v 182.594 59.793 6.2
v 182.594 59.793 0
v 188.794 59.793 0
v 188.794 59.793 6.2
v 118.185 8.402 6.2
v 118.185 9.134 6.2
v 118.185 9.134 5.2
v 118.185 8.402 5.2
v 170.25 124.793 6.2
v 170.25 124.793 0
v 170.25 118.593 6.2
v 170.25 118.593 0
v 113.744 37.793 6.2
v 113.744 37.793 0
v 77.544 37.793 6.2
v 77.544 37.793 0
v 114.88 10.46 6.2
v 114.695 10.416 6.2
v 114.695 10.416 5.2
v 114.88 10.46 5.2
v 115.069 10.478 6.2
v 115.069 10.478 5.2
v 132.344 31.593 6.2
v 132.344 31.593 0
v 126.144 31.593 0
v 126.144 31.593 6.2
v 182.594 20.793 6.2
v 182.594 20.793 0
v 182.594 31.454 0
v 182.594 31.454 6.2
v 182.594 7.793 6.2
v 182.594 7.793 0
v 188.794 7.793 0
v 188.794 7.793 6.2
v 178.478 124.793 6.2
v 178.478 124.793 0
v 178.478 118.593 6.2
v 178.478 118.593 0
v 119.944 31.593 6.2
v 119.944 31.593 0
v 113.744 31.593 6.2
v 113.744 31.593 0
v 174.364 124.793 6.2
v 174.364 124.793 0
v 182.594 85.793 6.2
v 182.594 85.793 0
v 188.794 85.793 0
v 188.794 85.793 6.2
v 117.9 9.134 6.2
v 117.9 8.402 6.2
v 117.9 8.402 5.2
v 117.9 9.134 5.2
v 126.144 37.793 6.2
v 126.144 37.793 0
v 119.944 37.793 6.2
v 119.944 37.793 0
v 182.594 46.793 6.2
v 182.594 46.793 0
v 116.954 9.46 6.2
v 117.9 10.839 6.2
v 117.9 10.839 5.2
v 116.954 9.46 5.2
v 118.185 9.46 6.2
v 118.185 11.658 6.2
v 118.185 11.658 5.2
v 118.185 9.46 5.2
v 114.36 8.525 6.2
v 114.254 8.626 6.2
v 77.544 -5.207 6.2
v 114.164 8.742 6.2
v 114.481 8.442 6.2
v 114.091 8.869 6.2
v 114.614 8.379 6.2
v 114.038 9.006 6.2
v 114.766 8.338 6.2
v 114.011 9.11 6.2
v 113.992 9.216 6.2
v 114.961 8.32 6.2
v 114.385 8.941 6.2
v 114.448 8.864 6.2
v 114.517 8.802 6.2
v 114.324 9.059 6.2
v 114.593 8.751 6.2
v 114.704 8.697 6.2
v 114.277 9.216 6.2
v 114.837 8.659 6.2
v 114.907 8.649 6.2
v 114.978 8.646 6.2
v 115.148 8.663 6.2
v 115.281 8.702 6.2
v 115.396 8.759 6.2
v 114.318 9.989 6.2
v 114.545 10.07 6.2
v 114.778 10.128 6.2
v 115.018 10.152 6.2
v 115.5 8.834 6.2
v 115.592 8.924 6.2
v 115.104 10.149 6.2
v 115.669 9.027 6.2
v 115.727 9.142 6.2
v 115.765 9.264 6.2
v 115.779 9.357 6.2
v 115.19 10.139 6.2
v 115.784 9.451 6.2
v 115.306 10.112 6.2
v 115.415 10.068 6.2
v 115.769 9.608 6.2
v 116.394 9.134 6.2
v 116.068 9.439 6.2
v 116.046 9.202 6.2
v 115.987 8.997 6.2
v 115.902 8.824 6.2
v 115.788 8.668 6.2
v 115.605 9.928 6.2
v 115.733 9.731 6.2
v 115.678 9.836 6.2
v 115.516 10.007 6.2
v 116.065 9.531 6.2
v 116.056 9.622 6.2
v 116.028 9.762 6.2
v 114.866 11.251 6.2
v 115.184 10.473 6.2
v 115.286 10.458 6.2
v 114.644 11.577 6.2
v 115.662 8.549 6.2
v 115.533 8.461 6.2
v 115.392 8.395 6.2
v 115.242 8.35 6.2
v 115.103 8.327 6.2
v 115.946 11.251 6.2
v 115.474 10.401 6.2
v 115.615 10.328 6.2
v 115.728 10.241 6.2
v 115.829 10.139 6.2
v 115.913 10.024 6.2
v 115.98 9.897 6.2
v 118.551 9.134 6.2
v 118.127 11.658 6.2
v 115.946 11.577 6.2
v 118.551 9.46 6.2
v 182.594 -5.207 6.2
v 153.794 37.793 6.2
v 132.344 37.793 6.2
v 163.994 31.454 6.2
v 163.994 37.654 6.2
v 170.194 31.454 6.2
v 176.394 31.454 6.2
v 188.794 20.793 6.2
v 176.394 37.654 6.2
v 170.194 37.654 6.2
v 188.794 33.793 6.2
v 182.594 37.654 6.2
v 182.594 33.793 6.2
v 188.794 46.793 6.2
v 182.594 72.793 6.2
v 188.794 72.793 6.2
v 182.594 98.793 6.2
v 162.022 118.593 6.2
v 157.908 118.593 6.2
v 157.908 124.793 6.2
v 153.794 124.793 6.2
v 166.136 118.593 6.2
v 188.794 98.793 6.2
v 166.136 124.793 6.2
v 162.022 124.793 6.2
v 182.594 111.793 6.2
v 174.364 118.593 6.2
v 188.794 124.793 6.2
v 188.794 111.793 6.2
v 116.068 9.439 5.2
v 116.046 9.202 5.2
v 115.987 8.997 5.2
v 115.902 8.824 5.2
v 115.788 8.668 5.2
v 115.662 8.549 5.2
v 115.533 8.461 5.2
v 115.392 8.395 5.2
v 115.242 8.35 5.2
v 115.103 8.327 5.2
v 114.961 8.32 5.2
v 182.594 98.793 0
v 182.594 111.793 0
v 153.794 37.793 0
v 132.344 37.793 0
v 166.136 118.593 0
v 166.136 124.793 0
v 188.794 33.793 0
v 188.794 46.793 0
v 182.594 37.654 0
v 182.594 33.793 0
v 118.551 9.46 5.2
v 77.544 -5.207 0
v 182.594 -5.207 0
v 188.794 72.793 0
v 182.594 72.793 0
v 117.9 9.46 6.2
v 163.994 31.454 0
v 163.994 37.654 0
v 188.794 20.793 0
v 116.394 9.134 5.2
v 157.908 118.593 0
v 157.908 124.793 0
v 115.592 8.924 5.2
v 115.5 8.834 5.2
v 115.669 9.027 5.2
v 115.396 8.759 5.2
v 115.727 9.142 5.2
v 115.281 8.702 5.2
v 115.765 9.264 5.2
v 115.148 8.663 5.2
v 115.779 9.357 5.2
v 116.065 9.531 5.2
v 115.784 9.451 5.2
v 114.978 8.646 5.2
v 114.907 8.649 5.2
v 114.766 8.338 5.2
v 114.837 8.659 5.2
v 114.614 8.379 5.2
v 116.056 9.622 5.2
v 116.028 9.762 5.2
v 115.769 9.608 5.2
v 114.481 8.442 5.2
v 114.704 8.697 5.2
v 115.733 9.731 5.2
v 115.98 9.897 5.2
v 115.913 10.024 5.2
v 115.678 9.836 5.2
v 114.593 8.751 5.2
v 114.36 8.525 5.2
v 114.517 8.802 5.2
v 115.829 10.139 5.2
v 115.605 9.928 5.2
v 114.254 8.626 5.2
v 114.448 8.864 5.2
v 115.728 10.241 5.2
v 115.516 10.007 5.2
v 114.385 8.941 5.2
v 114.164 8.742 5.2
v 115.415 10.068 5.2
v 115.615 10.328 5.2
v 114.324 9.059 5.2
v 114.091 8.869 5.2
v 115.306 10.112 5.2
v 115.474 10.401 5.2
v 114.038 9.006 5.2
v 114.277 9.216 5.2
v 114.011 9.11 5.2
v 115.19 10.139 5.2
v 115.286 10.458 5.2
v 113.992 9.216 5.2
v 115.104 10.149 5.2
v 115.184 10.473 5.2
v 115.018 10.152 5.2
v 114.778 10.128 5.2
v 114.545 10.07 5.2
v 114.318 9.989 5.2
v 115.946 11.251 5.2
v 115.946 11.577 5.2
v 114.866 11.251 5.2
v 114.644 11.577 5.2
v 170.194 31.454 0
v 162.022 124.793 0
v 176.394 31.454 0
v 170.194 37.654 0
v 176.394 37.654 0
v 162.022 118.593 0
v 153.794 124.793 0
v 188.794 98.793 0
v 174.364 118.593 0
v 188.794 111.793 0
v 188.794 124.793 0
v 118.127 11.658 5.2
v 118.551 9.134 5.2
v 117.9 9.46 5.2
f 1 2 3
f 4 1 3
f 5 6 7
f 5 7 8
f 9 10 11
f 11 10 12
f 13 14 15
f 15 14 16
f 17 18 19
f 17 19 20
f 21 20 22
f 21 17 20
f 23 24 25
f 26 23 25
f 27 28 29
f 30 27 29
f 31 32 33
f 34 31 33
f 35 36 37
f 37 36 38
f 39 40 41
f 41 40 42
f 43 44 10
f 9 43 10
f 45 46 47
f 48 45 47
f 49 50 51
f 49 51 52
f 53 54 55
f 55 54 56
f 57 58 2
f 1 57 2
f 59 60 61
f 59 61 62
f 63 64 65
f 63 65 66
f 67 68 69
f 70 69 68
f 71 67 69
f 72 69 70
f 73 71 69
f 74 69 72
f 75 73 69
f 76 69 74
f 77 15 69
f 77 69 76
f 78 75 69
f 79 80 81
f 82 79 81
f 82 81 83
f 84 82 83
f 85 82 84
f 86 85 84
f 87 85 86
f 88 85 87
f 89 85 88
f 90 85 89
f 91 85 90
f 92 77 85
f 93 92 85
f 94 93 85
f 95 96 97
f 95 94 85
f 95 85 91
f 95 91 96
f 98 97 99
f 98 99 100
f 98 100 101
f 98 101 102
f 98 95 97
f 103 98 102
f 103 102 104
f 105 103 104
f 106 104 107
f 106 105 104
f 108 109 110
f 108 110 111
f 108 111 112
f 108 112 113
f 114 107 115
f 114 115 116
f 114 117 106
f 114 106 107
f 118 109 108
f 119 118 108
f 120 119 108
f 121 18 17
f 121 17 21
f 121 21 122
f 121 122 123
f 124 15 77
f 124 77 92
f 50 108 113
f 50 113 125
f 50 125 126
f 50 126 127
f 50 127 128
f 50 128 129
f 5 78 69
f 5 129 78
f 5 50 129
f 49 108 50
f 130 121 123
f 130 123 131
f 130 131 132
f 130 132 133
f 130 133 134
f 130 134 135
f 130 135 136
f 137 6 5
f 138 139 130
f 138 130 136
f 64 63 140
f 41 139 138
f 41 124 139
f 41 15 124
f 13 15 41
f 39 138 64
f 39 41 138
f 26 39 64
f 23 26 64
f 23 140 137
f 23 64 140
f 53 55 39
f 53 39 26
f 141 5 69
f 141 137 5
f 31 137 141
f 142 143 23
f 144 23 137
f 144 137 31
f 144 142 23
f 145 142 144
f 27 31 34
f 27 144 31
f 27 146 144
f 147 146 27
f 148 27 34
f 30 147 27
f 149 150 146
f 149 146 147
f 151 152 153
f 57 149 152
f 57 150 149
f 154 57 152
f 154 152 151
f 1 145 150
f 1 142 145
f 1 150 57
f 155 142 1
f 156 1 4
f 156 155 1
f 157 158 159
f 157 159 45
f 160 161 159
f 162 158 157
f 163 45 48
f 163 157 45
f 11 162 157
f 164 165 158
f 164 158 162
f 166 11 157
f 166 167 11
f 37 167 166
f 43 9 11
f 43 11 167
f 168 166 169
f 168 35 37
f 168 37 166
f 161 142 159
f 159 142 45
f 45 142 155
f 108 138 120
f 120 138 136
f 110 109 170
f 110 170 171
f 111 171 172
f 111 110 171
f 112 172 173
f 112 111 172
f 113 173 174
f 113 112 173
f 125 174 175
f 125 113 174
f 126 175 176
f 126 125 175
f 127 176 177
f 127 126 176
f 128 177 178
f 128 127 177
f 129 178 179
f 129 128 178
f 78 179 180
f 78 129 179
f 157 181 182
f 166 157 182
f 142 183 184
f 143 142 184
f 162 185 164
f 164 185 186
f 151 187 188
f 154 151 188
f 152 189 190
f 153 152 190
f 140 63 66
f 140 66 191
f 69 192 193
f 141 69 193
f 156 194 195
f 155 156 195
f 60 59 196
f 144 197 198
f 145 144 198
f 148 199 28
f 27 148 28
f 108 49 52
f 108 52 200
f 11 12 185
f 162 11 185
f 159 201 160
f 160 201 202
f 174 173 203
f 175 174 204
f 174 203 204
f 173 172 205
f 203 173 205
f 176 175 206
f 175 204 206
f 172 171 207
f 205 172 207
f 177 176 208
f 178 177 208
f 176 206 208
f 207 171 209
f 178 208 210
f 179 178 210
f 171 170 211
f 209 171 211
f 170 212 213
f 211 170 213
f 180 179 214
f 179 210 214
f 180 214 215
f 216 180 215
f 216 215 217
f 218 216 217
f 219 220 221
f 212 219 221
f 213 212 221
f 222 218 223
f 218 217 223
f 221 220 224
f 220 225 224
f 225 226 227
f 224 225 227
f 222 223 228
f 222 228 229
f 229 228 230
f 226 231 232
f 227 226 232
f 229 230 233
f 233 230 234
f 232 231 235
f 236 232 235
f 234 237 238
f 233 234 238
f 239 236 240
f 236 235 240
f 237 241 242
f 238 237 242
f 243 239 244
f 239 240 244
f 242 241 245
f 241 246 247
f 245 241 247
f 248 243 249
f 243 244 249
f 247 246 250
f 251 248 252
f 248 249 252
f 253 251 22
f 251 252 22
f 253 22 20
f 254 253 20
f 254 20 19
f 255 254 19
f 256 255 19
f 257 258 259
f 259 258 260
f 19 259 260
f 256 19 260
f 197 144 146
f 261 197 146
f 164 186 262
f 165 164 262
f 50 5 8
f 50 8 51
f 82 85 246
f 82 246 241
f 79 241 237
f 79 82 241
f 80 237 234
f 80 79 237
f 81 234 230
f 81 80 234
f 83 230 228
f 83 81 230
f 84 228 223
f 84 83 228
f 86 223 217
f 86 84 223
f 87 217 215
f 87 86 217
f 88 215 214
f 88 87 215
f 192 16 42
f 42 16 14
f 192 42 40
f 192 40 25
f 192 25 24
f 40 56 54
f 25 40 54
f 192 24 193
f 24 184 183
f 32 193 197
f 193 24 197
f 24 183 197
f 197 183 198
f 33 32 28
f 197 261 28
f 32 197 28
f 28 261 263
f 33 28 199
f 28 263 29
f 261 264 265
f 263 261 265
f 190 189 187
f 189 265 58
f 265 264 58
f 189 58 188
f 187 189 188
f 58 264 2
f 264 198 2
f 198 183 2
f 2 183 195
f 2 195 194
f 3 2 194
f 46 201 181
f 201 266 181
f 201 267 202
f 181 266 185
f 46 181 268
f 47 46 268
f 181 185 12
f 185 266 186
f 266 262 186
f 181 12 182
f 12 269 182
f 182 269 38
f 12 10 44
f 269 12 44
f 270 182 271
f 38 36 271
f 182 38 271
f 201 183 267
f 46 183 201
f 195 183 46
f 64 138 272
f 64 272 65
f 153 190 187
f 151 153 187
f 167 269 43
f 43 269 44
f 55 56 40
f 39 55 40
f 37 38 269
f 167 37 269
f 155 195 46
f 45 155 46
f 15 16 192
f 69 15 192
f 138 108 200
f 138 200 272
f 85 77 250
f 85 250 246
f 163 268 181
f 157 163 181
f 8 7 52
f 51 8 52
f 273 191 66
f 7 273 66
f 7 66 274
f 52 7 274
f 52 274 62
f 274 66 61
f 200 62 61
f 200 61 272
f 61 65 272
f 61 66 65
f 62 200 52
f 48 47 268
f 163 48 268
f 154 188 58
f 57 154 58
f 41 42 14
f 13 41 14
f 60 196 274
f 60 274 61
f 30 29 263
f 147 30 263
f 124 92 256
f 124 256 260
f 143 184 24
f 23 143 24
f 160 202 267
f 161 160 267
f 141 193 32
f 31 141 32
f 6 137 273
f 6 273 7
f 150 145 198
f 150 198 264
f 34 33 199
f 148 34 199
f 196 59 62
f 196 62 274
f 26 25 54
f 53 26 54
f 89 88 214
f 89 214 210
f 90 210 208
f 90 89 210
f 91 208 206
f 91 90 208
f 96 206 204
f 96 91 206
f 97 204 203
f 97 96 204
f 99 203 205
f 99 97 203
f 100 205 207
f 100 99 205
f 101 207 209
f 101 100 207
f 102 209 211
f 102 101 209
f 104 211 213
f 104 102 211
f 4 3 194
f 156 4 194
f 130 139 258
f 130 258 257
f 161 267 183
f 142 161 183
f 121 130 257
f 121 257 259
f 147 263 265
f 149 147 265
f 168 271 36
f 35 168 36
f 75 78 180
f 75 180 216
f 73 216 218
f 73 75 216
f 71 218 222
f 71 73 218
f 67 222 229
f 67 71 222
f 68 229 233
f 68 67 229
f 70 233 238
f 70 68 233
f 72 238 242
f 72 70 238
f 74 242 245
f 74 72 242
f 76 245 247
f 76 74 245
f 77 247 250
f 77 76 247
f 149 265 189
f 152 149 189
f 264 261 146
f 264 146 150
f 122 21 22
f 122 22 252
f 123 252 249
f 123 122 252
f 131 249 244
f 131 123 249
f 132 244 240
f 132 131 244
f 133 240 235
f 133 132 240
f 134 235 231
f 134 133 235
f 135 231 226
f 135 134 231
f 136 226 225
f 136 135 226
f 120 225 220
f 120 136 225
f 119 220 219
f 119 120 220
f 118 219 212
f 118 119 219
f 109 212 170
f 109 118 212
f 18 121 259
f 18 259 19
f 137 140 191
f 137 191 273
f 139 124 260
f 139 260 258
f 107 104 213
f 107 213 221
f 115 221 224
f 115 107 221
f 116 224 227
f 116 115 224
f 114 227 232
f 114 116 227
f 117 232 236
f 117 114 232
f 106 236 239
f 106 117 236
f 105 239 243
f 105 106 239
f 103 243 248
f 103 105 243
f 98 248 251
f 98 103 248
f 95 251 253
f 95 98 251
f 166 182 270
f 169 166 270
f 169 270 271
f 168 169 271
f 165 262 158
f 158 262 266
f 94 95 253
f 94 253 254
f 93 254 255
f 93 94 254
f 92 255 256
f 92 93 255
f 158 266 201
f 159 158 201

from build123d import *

# Parameters (mm, degrees)
SKETCH6_W           = 6.2
SKETCH6_H           = 6.2
BOSS_EXTRUDE4_DEPTH = 6.2
CUT_EXTRUDE3_DEPTH  = 1


with BuildPart() as part:
    # Sketch6 → Boss-Extrude4 (new body)
    with BuildSketch(Plane.XY):
        Polygon((157.908027241, 124.79254071), (153.794027241, 124.79254071), (153.794027241, 37.79254071), (132.344027241, 37.79254071), (132.344027241, 31.59254071), (126.144027241, 31.59254071), (126.144027241, 37.79254071), (119.944027241, 37.79254071), (119.944027241, 31.59254071), (113.744027241, 31.59254071), (113.744027241, 37.79254071), (77.544027241, 37.79254071), (77.544027241, -5.20745929), (182.594027241, -5.20745929), (182.594027241, 7.79254071), (188.794027241, 7.79254071), (188.794027241, 20.79254071), (182.594027241, 20.79254071), (182.594027241, 31.453899243), (176.394027241, 31.453899243), (176.394027241, 37.653899243), (182.594027241, 37.653899243), (182.594027241, 33.79254071), (188.794027241, 33.79254071), (188.794027241, 46.79254071), (182.594027241, 46.79254071), (182.594027241, 59.79254071), (188.794027241, 59.79254071), (188.794027241, 72.79254071), (182.594027241, 72.79254071), (182.594027241, 85.79254071), (188.794027241, 85.79254071), (188.794027241, 98.79254071), (182.594027241, 98.79254071), (182.594027241, 111.79254071), (188.794027241, 111.79254071), (188.794027241, 124.79254071), (178.478027241, 124.79254071), (178.478027241, 118.59254071), (174.364027241, 118.59254071), (174.364027241, 124.79254071), (170.250027241, 124.79254071), (170.250027241, 118.59254071), (166.136027241, 118.59254071), (166.136027241, 124.79254071), (162.022027241, 124.79254071), (162.022027241, 118.59254071), (157.908027241, 118.59254071), align=None)
        with Locations((167.094027241, 34.553899243)):
            Rectangle(SKETCH6_W, SKETCH6_H, mode=Mode.SUBTRACT)
    extrude(amount=BOSS_EXTRUDE4_DEPTH)

    # Sketch7 → Cut-Extrude3 (cut)
    with BuildSketch(Plane.XY.offset(6.2)):
        with BuildLine():
            Line((115.946331614, 11.576783669), (115.946331614, 11.251142644))
            Line((115.946331614, 11.251142644), (114.866373682, 11.251142644))
            Line((114.866373682, 11.251142644), (114.69528494, 10.416051498))
            add(Edge.make_bspline(
                [(114.69528494, 10.416051498), (114.728899911, 10.425331816), (114.794023603, 10.443310964), (114.890144334, 10.463273342), (114.981395832, 10.475306994), (115.040609919, 10.476950112), (115.069263305, 10.477745208)],
                knots=[0, 0, 0, 0, 0.000104595, 0.000202637, 0.000294305, 0.000380252, 0.000380252, 0.000380252, 0.000380252], degree=3))
            add(Edge.make_bspline(
                [(115.069263305, 10.477745208), (115.10471784, 10.476977823), (115.174430315, 10.475468954), (115.276428503, 10.460980204), (115.37379477, 10.43817471), (115.466325492, 10.40631538), (115.554191848, 10.365575836), (115.636585422, 10.314685176), (115.714742957, 10.255237083), (115.78726231, 10.186888393), (115.853052218, 10.111666641), (115.910897081, 10.030787715), (115.960030287, 9.945037622), (115.999546115, 9.853597069), (116.031100475, 9.75747698), (116.052102642, 9.655665995), (116.0660878, 9.549123772), (116.06765025, 9.476276054), (116.068446999, 9.439128421)],
                knots=[0, 0, 0, 0, 0.000106308, 0.000209029, 0.000308378, 0.000405929, 0.000502102, 0.000598312, 0.00069588, 0.000796219, 0.000896736, 0.000995218, 0.001094066, 0.001192613, 0.001293582, 0.001396995, 0.001504047, 0.001615439, 0.001615439, 0.001615439, 0.001615439], degree=3))
            add(Edge.make_bspline(
                [(116.068446999, 9.439128421), (116.067843681, 9.413254692), (116.066645197, 9.361856897), (116.060550479, 9.285526086), (116.048815936, 9.21081123), (116.033060929, 9.137702418), (116.012611736, 9.066338059), (115.987856666, 8.996513887), (115.957561698, 8.928664494), (115.924331807, 8.862147885), (115.886915359, 8.798467811), (115.845387713, 8.738914802), (115.801513304, 8.682595489), (115.754304332, 8.630113888), (115.703322001, 8.581814865), (115.649183746, 8.537411781), (115.592321565, 8.496153717), (115.531855738, 8.459715426), (115.469133628, 8.426184744), (115.40324946, 8.398676964), (115.335702967, 8.374083842), (115.265521973, 8.354480913), (115.192865443, 8.339120668), (115.117613611, 8.32868798), (115.040161146, 8.321089354), (114.987660242, 8.320613688), (114.961140308, 8.320373413)],
                knots=[0, 0, 0, 0, 7.7636e-05, 0.000154223, 0.000229512, 0.000304362, 0.000378447, 0.000452077, 0.000526407, 0.000601214, 0.00067506, 0.000747747, 0.00081887, 0.000889121, 0.000959302, 0.001029336, 0.001099058, 0.00116985, 0.001240974, 0.00131221, 0.00138383, 0.001456517, 0.001530612, 0.001606437, 0.001684346, 0.001763871, 0.001763871, 0.001763871, 0.001763871], degree=3))
            add(Edge.make_bspline(
                [(114.961140308, 8.320373413), (114.929504444, 8.321000102), (114.867264619, 8.322233038), (114.776078105, 8.335131235), (114.688344141, 8.353604216), (114.604768978, 8.38139569), (114.524603617, 8.41621845), (114.448927295, 8.460229548), (114.375806341, 8.51010345), (114.308213279, 8.568959198), (114.245478804, 8.633289853), (114.189320757, 8.703101427), (114.139306727, 8.777241707), (114.096237628, 8.856070747), (114.059500137, 8.939381414), (114.030639398, 9.02748585), (114.007345461, 9.119923711), (113.997490787, 9.183562967), (113.99248546, 9.215886233)],
                knots=[0, 0, 0, 0, 9.4843e-05, 0.000186593, 0.000275792, 0.000363484, 0.000450342, 0.000537514, 0.000625728, 0.000715478, 0.000805885, 0.000894984, 0.00098389, 0.001073836, 0.001164117, 0.001256635, 0.001351658, 0.001449737, 0.001449737, 0.001449737, 0.001449737], degree=3))
            Line((113.99248546, 9.215886233), (114.277421358, 9.215886233))
            add(Edge.make_bspline(
                [(114.277421358, 9.215886233), (114.284432264, 9.185609023), (114.297907613, 9.127414543), (114.327485686, 9.045652541), (114.36364973, 8.972791531), (114.406652246, 8.907867695), (114.457951202, 8.851253818), (114.516488613, 8.800801198), (114.582118333, 8.755285188), (114.655046477, 8.717345963), (114.731984056, 8.684989308), (114.812508596, 8.663443128), (114.894427539, 8.648293032), (114.949834347, 8.646776506), (114.977676767, 8.646014439)],
                knots=[0, 0, 0, 0, 9.3172e-05, 0.000179081, 0.000260145, 0.000336703, 0.000411917, 0.000488562, 0.000568128, 0.000650923, 0.00073478, 0.000817953, 0.000900557, 0.000983994, 0.000983994, 0.000983994, 0.000983994], degree=3))
            add(Edge.make_bspline(
                [(114.977676767, 8.646014439), (115.004853355, 8.646759001), (115.058364281, 8.648225052), (115.137114611, 8.659509013), (115.213144861, 8.676887667), (115.28570482, 8.702895321), (115.356064217, 8.734504458), (115.42244328, 8.77506742), (115.486762318, 8.821749008), (115.547022125, 8.875231094), (115.602212197, 8.934167888), (115.650976678, 8.997193809), (115.691595736, 9.064428377), (115.725825963, 9.134707595), (115.751818598, 9.208801714), (115.770361488, 9.286363495), (115.781249978, 9.367584512), (115.782747834, 9.4229831), (115.783511101, 9.451212756)],
                knots=[0, 0, 0, 0, 8.15e-05, 0.000160473, 0.000238226, 0.000315066, 0.000391338, 0.000469218, 0.000547964, 0.000629516, 0.000710512, 0.000789892, 0.000868102, 0.000945761, 0.001024012, 0.00110315, 0.001184644, 0.001269321, 0.001269321, 0.001269321, 0.001269321], degree=3))
            add(Edge.make_bspline(
                [(115.783511101, 9.451212756), (115.782913767, 9.476681473), (115.781744568, 9.526532864), (115.772191837, 9.59946643), (115.755575726, 9.668475547), (115.732512635, 9.733893459), (115.70323051, 9.795781868), (115.66744707, 9.854204644), (115.624490773, 9.908391764), (115.575421703, 9.95836858), (115.521666194, 10.004492145), (115.46229937, 10.043811424), (115.39856358, 10.076889406), (115.331226729, 10.105435376), (115.258687142, 10.125937481), (115.18238134, 10.141329777), (115.101485326, 10.150233713), (115.046176202, 10.15146914), (115.017745877, 10.152104182)],
                knots=[0, 0, 0, 0, 7.6388e-05, 0.000149519, 0.000220172, 0.000288967, 0.000357247, 0.000425206, 0.000494043, 0.000564207, 0.000635056, 0.000706145, 0.000777268, 0.000850264, 0.000925136, 0.001002969, 0.001083601, 0.001168886, 0.001168886, 0.001168886, 0.001168886], degree=3))
            add(Edge.make_bspline(
                [(115.017745877, 10.152104182), (114.993136063, 10.151577503), (114.942323041, 10.150490044), (114.864378762, 10.142483151), (114.782471271, 10.129566076), (114.69691455, 10.111798552), (114.60745166, 10.088547504), (114.514271397, 10.060685064), (114.417177841, 10.027372965), (114.351756762, 10.002215885), (114.318126486, 9.989283669)],
                knots=[0, 0, 0, 0, 7.3822e-05, 0.000152423, 0.000234822, 0.000322511, 0.00041445, 0.000512043, 0.000614219, 0.000722306, 0.000722306, 0.000722306, 0.000722306], degree=3))
            Line((114.318126486, 9.989283669), (114.643767512, 11.576783669))
            Line((114.643767512, 11.576783669), (115.946331614, 11.576783669))
        make_face()
        Polygon((118.127236061, 11.658193926), (118.185113666, 11.658193926), (118.185113666, 9.460117003), (118.551459819, 9.460117003), (118.551459819, 9.134475977), (118.185113666, 9.134475977), (118.185113666, 8.401783669), (117.900177768, 8.401783669), (117.900177768, 9.134475977), (116.394088025, 9.134475977), align=None)
        Polygon((117.900177768, 9.460117003), (117.900177768, 10.839003221), (116.953783537, 9.460117003), align=None, mode=Mode.SUBTRACT)
    extrude(amount=-CUT_EXTRUDE3_DEPTH, mode=Mode.SUBTRACT)


solid = part.part
